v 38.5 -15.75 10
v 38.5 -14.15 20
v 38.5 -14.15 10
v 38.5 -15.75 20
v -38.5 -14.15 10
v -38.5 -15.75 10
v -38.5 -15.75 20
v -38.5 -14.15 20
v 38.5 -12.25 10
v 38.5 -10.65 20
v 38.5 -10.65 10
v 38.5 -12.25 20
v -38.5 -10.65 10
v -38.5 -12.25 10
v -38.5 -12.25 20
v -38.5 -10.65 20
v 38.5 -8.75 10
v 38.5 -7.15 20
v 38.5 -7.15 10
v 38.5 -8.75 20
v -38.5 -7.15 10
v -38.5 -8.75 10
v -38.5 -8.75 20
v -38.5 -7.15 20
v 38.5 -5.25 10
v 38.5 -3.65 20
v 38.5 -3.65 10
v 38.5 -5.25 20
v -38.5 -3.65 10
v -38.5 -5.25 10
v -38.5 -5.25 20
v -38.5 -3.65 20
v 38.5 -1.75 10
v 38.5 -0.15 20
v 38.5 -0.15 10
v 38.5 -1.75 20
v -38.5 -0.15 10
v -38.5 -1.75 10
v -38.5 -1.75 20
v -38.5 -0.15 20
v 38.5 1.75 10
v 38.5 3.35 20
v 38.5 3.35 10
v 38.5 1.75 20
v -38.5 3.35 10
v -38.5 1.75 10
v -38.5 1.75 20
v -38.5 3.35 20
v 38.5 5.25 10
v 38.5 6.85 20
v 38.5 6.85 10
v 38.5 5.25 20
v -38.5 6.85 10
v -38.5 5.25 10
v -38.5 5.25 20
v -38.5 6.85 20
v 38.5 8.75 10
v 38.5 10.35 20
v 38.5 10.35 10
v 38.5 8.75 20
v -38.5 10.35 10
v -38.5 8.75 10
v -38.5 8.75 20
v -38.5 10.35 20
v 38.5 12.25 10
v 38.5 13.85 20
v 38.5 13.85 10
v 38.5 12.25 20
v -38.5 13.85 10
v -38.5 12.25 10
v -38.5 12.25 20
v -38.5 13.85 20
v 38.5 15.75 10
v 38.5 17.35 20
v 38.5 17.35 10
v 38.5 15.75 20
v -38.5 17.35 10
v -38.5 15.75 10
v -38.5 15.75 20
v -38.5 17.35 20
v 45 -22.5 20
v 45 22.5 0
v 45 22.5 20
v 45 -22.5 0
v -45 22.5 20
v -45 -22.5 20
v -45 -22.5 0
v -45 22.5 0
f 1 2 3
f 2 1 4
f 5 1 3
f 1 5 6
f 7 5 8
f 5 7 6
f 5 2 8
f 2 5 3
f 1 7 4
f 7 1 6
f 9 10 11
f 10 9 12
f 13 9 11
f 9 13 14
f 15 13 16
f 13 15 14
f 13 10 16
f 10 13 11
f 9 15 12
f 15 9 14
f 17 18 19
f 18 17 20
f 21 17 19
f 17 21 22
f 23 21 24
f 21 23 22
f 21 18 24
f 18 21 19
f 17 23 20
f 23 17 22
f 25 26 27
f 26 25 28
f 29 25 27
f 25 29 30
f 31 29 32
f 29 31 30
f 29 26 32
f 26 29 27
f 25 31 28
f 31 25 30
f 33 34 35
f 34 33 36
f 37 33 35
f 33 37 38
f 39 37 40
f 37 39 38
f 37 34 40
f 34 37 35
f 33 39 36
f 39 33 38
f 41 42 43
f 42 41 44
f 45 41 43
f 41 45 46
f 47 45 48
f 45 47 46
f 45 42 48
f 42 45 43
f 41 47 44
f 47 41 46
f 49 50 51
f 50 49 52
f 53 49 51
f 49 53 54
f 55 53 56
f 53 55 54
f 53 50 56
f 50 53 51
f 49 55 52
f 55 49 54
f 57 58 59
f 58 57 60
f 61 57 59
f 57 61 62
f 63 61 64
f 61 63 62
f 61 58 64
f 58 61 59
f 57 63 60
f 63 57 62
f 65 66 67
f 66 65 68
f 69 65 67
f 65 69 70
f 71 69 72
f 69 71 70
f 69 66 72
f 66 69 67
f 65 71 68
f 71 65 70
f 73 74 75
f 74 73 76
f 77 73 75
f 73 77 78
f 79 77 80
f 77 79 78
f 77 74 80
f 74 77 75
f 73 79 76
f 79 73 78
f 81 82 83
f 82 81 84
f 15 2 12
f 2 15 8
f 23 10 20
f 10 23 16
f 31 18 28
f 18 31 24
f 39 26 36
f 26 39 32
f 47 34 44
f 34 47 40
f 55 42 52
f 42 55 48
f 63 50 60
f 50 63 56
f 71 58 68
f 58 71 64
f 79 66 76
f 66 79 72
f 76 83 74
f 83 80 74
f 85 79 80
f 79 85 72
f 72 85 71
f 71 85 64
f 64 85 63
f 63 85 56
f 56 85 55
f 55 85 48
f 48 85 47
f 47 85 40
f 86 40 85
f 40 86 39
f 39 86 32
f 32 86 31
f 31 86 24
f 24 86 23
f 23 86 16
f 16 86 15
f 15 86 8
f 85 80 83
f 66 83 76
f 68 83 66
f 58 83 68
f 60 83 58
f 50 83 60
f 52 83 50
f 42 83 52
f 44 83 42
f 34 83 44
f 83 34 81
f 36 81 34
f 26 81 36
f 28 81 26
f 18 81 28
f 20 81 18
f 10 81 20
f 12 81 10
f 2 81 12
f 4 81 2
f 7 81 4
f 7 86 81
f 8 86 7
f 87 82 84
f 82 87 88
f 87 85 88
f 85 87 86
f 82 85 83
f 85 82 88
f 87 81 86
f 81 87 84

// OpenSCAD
// Sliding rack for 10 microscope slides, standing on their long edge
// Print orientation: base block rests on XY plane, slots open upward (+Z)

// ---------------- Parameters ----------------
n_slots      = 10;    // number of slide slots
slot_len     = 77;    // slot length along X (mm)
slot_w       = 1.6;   // slot width along Y (mm)
slot_depth   = 10;    // slot depth into block along Z (mm)
slot_pitch   = 3.5;   // centre-to-centre spacing of slots along Y (mm)

block_len    = 90;    // base block length along X (mm)
block_w      = 45;    // base block width along Y (mm)
block_h      = 20;    // base block height along Z (mm)

eps          = 0.5;   // overcut so cutting faces are not coplanar (mm)

// ---------------- Model ----------------
difference() {
    // Base block, centred in X and Y, sitting on z = 0
    translate([-block_len/2, -block_w/2, 0])
        cube([block_len, block_w, block_h]);

    // Row of parallel slots, centred on the block in X and Y
    for (i = [0 : n_slots - 1]) {
        y_c = (i - (n_slots - 1)/2) * slot_pitch;
        translate([-slot_len/2, y_c, block_h - slot_depth])
            cube([slot_len, slot_w, slot_depth + eps]);
    }
}
